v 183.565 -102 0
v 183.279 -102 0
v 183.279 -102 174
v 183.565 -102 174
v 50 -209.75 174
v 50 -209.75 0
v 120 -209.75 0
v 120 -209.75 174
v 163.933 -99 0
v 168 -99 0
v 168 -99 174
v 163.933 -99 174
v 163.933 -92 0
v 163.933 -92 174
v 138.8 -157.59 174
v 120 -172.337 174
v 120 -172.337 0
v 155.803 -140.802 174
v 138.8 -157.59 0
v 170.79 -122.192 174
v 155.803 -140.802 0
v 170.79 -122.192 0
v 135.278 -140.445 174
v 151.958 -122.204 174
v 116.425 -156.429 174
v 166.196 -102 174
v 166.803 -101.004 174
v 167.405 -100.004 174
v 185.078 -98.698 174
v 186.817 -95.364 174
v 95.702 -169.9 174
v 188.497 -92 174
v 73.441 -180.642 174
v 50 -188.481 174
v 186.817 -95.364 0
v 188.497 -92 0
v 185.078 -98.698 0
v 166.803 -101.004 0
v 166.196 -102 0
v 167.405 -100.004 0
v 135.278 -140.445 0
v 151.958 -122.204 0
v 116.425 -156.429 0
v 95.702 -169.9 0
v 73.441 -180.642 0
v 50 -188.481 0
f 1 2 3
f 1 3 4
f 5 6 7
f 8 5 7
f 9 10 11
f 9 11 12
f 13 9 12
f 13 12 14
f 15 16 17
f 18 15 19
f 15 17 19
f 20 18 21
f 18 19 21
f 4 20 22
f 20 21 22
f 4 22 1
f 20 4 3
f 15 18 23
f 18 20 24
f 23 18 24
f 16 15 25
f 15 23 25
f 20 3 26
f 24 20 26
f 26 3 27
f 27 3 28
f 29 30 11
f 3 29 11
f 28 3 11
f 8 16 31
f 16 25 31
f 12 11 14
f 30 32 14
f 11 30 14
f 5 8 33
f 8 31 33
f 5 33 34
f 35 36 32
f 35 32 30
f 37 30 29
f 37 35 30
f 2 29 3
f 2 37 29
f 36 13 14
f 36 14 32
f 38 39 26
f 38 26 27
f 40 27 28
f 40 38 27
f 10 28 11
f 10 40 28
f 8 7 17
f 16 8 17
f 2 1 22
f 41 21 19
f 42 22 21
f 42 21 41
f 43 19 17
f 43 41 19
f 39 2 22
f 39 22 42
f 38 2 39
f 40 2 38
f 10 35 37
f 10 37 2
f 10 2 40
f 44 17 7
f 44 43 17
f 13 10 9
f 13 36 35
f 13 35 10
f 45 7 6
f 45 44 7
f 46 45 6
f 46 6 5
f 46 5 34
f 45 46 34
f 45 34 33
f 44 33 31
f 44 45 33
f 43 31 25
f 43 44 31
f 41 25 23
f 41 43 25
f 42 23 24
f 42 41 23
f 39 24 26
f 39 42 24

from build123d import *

# Parameters (mm, degrees)
SKETCH_1_R          = 210
SKETCH_1_R_2        = 203
EXTRUDE_2_DEPTH     = 174
EXTRUDE_START       = -174
EXTRUDE_4_DEPTH     = 174
CUT_EXTRUDE_1_DEPTH = 654
EXTRUDE_5_DEPTH     = 174
EXTRUDE_6_DEPTH     = 174
EXTRUDE_7_DEPTH     = 174
EXTRUDE_8_DEPTH     = 174
CUT_EXTRUDE_START   = -654
CUT_EXTRUDE_2_DEPTH = 654
SKETCH_10_W         = 20.487801248
SKETCH_10_H         = 174
CUT_EXTRUDE_3_DEPTH = 327
SKETCH_11_W         = 235.63772895
SKETCH_11_H         = 249.192111589
CUT_EXTRUDE_4_DEPTH = 238


with BuildPart() as part:
    # 草图1 → 凸台-拉伸2 (new body)
    with BuildSketch(Plane.XY):
        Circle(SKETCH_1_R)
        Circle(SKETCH_1_R_2, mode=Mode.SUBTRACT)
    extrude(amount=EXTRUDE_2_DEPTH)

    # 草图2 → 凸台-拉伸4 (add)
    with BuildSketch(Plane.XY.offset(174).offset(EXTRUDE_START)):
        with BuildLine():
            Line((-170.735431044, -102), (-173.735431044, -102))
            Line((-173.735431044, -102), (-175.513532242, -102))
            ThreePointArc((-175.513532242, -102), (-174.63092392, -103.50381834), (-173.735431044, -105))
            Line((-173.735431044, -105), (-170.735431044, -105))
            Line((-170.735431044, -105), (-170.735431044, -102))
        make_face()
        with BuildLine():
            ThreePointArc((173.735431044, -105), (174.63092392, -103.50381834), (175.513532242, -102))
            Line((175.513532242, -102), (173.735431044, -102))
            Line((173.735431044, -102), (170.735431044, -102))
            Line((170.735431044, -102), (170.735431044, -105))
            Line((170.735431044, -105), (173.735431044, -105))
        make_face()
    extrude(amount=EXTRUDE_4_DEPTH)

    # 草图3 → 切除-拉伸1 (cut)
    with BuildSketch(Plane.XY.offset(174)):
        Polygon((-170.735431044, -102), (238.333646515, -102), (254.334169784, 272.292523591), (-334.569415043, 221.85110305), (-306.830562533, -102), align=None)
    extrude(amount=-CUT_EXTRUDE_1_DEPTH, mode=Mode.SUBTRACT)

    # 草图5 → 凸台-拉伸5 (add)
    with BuildSketch(Plane.XY.offset(174).offset(EXTRUDE_START)):
        with BuildLine():
            Line((-120, -209.75), (-10.243900624, -209.75))
            ThreePointArc((-10.243900624, -209.75), (-67.755470707, -198.769203322), (-120, -172.336879396))
            Line((-120, -172.336879396), (-120, -209.75))
        make_face()
        with BuildLine():
            ThreePointArc((120, -172.336879396), (67.755470707, -198.769203322), (10.243900624, -209.75))
            Line((10.243900624, -209.75), (120, -209.75))
            Line((120, -209.75), (120, -172.336879396))
        make_face()
    extrude(amount=EXTRUDE_5_DEPTH)

    # 草图6 → 凸台-拉伸6 (add)
    with BuildSketch(Plane.XY.offset(174).offset(EXTRUDE_START)):
        with BuildLine():
            Line((-175.513532242, -102), (-166.195667814, -102))
            ThreePointArc((-166.195667814, -102), (0, -195), (166.195667814, -102))
            Line((166.195667814, -102), (175.513532242, -102))
            ThreePointArc((175.513532242, -102), (0, -203), (-175.513532242, -102))
        make_face()
    extrude(amount=EXTRUDE_6_DEPTH)

    # 草图7 → 凸台-拉伸7 (add)
    with BuildSketch(Plane.XY.offset(174).offset(EXTRUDE_START)):
        with BuildLine():
            Line((-166.933126535, -92), (-166.933126535, -95))
            Line((-166.933126535, -95), (-170.293863659, -95))
            ThreePointArc((-170.293863659, -95), (0, -195), (170.293863659, -95))
            Line((170.293863659, -95), (166.933126535, -95))
            Line((166.933126535, -95), (166.933126535, -92))
            Line((166.933126535, -92), (171.933126535, -92))
            Line((171.933126535, -92), (188.496850106, -92))
            ThreePointArc((188.496850106, -92), (0, -209.75), (-188.496850106, -92))
            Line((-188.496850106, -92), (-171.933126535, -92))
            Line((-171.933126535, -92), (-166.933126535, -92))
        make_face()
    extrude(amount=EXTRUDE_7_DEPTH)

    # 草图8 → 凸台-拉伸8 (add)
    with BuildSketch(Plane(origin=(0, 0, 0), x_dir=(-1, 0, 0), z_dir=(0, 0, -1))):
        with BuildLine():
            Line((166.933126535, -92), (163.933126535, -92))
            Line((163.933126535, -92), (163.933126535, -99))
            Line((163.933126535, -99), (168, -99))
            ThreePointArc((168, -99), (169.158755456, -97.006780447), (170.293863659, -95))
            Line((170.293863659, -95), (166.933126535, -95))
            Line((166.933126535, -95), (166.933126535, -92))
        make_face()
        with BuildLine():
            Line((-166.933126535, -95), (-170.293863659, -95))
            ThreePointArc((-170.293863659, -95), (-169.158755456, -97.006780447), (-168, -99))
            Line((-168, -99), (-163.933126535, -99))
            Line((-163.933126535, -99), (-163.933126535, -92))
            Line((-163.933126535, -92), (-166.933126535, -92))
            Line((-166.933126535, -92), (-166.933126535, -95))
        make_face()
    extrude(amount=-EXTRUDE_8_DEPTH)

    # 草图9 → 切除-拉伸2 (cut)
    with BuildSketch(Plane.XY.offset(174).offset(CUT_EXTRUDE_START)):
        with BuildLine():
            Line((0, -195), (0, -182.225251044))
            Line((0, -182.225251044), (-50, -182.225251044))
            Line((-50, -182.225251044), (-50, -188.48076825))
            ThreePointArc((-50, -188.48076825), (-25.211606368, -193.363323576), (0, -195))
        make_face()
        with BuildLine():
            Line((0, -209.75), (0, -195))
            ThreePointArc((0, -195), (-25.211606368, -193.363323576), (-50, -188.48076825))
            Line((-50, -188.48076825), (-50, -195))
            Line((-50, -195), (-50, -209.75))
            Line((-50, -209.75), (-10.243900624, -209.75))
            Line((-10.243900624, -209.75), (0, -209.75))
        make_face()
        with BuildLine():
            ThreePointArc((50, -188.48076825), (25.211606368, -193.363323576), (0, -195))
            Line((0, -195), (0, -209.75))
            Line((0, -209.75), (10.243900624, -209.75))
            Line((10.243900624, -209.75), (50, -209.75))
            Line((50, -209.75), (50, -195))
            Line((50, -195), (50, -188.48076825))
        make_face()
        with BuildLine():
            Line((50, -182.225251044), (0, -182.225251044))
            Line((0, -182.225251044), (0, -195))
            ThreePointArc((0, -195), (25.211606368, -193.363323576), (50, -188.48076825))
            Line((50, -188.48076825), (50, -182.225251044))
        make_face()
    extrude(amount=CUT_EXTRUDE_2_DEPTH, mode=Mode.SUBTRACT)


with BuildPart() as cut_extrude_2_piece_1:
    # of the separate pieces the step leaves, piece 1, a body of its own (cut_extrude_2_pieces)
    add(part.part.solids().sort_by_distance((-183.564702489, -102, 0))[0])

    # 草图11 → 切除-拉伸4 (cut)
    with BuildSketch(Plane(origin=(0, 0, 0), x_dir=(-1, 0, 0), z_dir=(0, 0, -1))):
        with Locations((136.586471206, -141.23053543)):
            Rectangle(SKETCH_11_W, SKETCH_11_H)
    extrude(amount=-CUT_EXTRUDE_4_DEPTH, mode=Mode.SUBTRACT)


with BuildPart() as cut_extrude_2_piece_2:
    # of the separate pieces the step leaves, piece 2, a body of its own (cut_extrude_2_pieces)
    add(part.part.solids().sort_by_distance((50, -188.48076825, 0))[0])


with BuildPart() as cut_extrude_2_piece_3:
    # of the separate pieces the step leaves, piece 3, a body of its own (cut_extrude_2_pieces)
    add(part.part.solids().sort_by_distance((10.243900624, -209.75, 0))[0])

    # 草图10 → 切除-拉伸3 (cut, symmetric)
    with BuildSketch(Plane(origin=(0, -209.75, 0), x_dir=(1, 0, 0), z_dir=(0, 1, 0))):
        with Locations((0, -87)):
            Rectangle(SKETCH_10_W, SKETCH_10_H)
    extrude(amount=CUT_EXTRUDE_3_DEPTH, both=True, mode=Mode.SUBTRACT)


solid = cut_extrude_2_piece_2.part
